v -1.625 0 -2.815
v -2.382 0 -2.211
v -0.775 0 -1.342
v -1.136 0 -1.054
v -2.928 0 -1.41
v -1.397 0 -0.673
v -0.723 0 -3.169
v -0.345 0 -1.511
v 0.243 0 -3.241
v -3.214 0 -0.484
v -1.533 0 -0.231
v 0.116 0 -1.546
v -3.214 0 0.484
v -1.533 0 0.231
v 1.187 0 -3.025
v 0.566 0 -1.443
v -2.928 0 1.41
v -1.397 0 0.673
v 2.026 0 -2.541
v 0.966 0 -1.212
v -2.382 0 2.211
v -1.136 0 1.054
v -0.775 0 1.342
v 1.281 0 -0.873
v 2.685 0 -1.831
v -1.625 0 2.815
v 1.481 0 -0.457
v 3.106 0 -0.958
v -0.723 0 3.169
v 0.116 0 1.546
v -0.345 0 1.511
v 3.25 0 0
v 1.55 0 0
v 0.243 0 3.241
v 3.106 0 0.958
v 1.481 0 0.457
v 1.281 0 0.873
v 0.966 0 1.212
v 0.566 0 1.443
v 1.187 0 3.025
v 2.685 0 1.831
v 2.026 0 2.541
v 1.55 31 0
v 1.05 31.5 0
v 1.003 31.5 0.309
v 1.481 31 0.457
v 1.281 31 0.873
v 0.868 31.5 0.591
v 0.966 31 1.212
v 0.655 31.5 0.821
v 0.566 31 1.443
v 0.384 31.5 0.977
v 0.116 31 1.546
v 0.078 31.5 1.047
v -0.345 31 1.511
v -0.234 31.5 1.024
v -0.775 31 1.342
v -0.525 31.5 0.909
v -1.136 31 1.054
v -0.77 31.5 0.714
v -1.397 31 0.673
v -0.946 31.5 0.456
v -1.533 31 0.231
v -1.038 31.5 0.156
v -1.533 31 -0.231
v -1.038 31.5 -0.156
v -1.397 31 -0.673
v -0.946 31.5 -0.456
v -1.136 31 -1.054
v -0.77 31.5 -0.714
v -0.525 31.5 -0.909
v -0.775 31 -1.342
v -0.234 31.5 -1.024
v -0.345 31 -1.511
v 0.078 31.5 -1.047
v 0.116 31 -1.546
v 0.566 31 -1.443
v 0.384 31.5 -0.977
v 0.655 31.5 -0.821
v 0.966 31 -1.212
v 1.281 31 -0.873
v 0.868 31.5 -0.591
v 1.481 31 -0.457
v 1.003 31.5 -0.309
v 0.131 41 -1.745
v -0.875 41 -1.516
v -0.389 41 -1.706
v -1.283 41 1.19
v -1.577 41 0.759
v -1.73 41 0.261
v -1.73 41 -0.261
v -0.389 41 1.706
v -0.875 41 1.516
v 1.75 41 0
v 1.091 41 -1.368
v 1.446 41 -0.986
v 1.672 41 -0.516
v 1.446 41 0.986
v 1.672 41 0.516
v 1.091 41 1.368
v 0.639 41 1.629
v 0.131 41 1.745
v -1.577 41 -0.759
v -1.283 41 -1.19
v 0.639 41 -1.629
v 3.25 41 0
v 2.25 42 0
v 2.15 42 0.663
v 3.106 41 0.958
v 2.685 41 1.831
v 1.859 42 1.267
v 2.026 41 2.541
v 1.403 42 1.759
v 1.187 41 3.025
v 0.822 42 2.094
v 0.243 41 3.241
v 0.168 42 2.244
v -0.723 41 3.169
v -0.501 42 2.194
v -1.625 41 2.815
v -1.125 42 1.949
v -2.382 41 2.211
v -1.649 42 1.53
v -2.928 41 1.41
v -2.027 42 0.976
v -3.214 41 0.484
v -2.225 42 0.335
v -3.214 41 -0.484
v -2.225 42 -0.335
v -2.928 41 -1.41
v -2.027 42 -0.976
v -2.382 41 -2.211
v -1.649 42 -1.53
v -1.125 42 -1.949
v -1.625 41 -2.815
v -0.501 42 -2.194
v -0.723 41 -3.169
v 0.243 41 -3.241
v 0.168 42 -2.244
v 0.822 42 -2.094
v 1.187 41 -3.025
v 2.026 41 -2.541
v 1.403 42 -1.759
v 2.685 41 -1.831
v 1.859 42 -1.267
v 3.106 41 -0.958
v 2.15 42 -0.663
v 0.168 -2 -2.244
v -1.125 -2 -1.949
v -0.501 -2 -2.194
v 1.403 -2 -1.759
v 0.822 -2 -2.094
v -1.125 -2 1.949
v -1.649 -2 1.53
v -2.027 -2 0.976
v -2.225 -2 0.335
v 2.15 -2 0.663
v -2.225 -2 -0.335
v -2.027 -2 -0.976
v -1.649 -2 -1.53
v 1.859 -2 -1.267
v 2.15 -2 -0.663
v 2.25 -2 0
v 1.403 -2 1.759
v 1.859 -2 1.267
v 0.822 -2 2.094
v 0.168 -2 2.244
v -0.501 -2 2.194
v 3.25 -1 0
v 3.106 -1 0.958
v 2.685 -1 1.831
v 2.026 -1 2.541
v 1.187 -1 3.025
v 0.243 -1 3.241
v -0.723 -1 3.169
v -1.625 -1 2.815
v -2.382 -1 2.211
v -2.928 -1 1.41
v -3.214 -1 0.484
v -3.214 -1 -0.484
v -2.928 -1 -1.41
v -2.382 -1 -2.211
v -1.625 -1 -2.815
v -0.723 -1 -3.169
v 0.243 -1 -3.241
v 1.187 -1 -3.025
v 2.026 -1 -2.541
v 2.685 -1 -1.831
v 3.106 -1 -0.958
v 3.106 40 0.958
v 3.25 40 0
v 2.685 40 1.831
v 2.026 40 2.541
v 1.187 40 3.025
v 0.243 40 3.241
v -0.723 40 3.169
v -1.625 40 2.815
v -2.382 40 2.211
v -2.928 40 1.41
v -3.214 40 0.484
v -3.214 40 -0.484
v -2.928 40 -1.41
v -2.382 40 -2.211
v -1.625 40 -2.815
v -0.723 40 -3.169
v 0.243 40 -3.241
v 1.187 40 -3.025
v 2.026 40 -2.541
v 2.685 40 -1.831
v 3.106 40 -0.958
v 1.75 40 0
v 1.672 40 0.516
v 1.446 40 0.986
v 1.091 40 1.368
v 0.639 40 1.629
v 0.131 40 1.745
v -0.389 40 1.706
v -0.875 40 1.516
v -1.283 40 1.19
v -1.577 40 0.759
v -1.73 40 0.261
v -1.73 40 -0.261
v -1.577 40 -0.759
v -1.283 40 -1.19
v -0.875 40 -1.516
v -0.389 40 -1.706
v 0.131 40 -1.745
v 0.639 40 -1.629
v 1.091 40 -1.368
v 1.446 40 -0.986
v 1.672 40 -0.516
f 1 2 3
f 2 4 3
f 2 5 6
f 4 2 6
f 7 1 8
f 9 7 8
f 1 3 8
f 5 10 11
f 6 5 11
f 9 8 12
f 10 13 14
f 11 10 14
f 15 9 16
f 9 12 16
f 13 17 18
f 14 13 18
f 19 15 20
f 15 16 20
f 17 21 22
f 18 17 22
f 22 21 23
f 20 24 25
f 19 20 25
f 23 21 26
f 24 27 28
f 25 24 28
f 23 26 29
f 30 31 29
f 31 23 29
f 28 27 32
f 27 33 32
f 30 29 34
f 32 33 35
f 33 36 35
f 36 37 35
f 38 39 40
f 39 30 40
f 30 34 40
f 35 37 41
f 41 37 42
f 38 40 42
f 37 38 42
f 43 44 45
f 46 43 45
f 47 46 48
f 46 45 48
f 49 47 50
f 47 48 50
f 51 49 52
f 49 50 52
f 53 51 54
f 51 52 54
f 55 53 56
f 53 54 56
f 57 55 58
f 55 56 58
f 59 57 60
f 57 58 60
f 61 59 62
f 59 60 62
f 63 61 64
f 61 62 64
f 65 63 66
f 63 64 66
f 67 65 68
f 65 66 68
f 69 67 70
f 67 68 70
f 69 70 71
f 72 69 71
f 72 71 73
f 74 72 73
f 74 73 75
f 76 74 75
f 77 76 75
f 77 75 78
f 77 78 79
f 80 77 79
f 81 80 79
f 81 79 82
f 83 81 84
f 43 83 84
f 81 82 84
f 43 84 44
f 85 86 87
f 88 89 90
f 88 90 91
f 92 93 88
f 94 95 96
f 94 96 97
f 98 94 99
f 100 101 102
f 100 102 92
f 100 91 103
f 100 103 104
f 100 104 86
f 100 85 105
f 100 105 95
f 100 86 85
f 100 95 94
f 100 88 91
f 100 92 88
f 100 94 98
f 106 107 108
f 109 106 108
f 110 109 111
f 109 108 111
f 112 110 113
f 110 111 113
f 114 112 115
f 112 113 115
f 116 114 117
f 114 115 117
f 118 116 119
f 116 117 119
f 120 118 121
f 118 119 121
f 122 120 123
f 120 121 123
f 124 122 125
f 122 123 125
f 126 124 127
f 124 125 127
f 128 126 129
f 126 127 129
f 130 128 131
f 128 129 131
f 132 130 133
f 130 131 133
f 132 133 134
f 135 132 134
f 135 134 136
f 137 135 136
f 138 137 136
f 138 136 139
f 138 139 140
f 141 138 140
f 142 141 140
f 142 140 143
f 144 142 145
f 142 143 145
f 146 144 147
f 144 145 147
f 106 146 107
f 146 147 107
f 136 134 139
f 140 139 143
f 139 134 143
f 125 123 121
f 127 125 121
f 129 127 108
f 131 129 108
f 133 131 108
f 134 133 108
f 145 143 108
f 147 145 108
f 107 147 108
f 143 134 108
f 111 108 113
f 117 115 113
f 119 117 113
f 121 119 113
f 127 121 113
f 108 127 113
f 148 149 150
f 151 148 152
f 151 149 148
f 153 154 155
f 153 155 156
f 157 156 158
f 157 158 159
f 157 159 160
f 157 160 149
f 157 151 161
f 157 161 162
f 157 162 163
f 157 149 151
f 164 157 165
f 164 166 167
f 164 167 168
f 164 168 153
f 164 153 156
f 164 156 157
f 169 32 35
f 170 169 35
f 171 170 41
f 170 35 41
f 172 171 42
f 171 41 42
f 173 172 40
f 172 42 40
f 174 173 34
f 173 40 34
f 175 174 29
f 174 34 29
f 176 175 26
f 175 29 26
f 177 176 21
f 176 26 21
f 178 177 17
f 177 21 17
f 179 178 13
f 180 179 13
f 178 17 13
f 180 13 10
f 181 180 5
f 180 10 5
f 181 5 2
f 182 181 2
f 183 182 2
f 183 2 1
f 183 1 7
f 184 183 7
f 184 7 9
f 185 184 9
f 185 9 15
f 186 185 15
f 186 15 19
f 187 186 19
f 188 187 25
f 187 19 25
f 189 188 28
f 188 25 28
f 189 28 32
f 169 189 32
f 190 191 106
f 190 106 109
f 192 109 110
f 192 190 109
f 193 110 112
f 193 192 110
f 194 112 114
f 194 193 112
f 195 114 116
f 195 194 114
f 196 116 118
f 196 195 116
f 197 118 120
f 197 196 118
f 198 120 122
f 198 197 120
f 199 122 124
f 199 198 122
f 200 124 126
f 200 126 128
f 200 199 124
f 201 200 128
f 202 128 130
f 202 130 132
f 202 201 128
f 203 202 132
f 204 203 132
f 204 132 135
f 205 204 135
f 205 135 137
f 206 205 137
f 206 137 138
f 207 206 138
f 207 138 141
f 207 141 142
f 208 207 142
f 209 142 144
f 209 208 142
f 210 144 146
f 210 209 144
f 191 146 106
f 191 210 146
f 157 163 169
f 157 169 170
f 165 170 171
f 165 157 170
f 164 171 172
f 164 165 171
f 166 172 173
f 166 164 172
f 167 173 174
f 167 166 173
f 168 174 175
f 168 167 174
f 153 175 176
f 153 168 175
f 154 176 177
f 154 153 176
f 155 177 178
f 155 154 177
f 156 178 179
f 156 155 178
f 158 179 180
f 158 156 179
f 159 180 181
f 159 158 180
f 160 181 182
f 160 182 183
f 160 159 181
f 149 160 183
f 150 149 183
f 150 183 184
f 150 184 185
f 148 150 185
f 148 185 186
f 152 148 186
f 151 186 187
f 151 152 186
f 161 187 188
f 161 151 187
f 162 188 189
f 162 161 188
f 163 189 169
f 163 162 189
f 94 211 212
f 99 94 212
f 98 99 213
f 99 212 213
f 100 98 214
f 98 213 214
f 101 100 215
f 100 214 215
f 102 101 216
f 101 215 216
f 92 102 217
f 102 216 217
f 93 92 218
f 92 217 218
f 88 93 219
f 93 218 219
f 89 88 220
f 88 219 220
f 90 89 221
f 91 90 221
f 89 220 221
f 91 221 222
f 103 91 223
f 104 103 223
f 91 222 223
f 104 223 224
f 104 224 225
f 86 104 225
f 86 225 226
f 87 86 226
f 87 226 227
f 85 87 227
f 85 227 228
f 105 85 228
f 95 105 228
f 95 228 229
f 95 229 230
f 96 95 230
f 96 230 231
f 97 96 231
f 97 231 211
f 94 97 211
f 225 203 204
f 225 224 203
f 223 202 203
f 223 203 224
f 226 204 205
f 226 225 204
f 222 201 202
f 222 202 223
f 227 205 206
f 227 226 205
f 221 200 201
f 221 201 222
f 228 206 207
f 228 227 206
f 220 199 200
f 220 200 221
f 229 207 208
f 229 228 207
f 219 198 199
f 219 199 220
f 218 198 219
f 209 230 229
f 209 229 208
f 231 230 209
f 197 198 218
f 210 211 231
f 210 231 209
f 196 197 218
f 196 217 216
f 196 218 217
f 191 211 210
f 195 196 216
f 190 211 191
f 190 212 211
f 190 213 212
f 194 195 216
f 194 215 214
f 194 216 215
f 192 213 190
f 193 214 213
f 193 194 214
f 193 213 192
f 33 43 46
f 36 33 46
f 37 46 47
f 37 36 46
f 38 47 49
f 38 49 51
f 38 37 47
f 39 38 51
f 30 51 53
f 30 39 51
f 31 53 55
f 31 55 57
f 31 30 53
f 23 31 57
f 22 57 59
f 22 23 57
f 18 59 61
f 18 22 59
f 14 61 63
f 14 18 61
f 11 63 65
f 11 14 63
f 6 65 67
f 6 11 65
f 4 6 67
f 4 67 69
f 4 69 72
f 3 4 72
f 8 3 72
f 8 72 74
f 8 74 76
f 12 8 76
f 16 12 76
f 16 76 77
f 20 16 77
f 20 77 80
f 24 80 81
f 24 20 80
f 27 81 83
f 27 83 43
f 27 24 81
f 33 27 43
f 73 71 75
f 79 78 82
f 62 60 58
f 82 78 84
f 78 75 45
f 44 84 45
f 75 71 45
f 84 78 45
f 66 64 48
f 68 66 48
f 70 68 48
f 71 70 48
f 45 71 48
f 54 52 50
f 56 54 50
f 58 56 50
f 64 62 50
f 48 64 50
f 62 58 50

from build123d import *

# Parameters (mm, degrees)
F0_R     = 1.55
F1_DEPTH = 31.5
F0_R_2   = 3.25
F0_R_3   = 1.75
F2_DEPTH = 2
F3_SIZE  = 1
F4_SIZE  = 0.5
F5_START = -40
F5_DEPTH = 2
F6_START = -41
F6_DEPTH = 1
F7_SIZE  = 1


with BuildPart() as f1:
    # F0 (on Front) → F1 (new body)
    with BuildSketch(Plane.XZ):
        Circle(F0_R)
    extrude(amount=-F1_DEPTH)

    # F0 (on Front) → F2 (join)
    with BuildSketch(Plane.XZ):
        Circle(F0_R_2)
        Circle(F0_R_3, mode=Mode.SUBTRACT)
        Circle(F0_R_3)
        Circle(F0_R, mode=Mode.SUBTRACT)
        Circle(F0_R)
    extrude(amount=F2_DEPTH)

    # F3
    f3_edges = [f1.edges().sort_by_distance(p)[0] for p in [
        (-3.25, -2, 0),
    ]]
    chamfer(f3_edges, length=F3_SIZE)

    # F4
    f4_edges = [f1.edges().sort_by_distance(p)[0] for p in [
        (-1.55, 31.5, 0),
    ]]
    chamfer(f4_edges, length=F4_SIZE)


with BuildPart() as f5:
    # F0 (on Front) → F5 (new body)
    with BuildSketch(Plane.XZ.offset(F5_START)):
        Circle(F0_R_2)
        Circle(F0_R_3, mode=Mode.SUBTRACT)
    extrude(amount=-F5_DEPTH)

    # F0 (on Front) → F6 (join)
    with BuildSketch(Plane.XZ.offset(F6_START)):
        Circle(F0_R_3)
        Circle(F0_R, mode=Mode.SUBTRACT)
        Circle(F0_R)
    extrude(amount=-F6_DEPTH)

    # F7
    f7_edges = [f5.edges().sort_by_distance(p)[0] for p in [
        (-3.25, 42, 0),
    ]]
    chamfer(f7_edges, length=F7_SIZE)


solid = Compound([f1.part, f5.part])
